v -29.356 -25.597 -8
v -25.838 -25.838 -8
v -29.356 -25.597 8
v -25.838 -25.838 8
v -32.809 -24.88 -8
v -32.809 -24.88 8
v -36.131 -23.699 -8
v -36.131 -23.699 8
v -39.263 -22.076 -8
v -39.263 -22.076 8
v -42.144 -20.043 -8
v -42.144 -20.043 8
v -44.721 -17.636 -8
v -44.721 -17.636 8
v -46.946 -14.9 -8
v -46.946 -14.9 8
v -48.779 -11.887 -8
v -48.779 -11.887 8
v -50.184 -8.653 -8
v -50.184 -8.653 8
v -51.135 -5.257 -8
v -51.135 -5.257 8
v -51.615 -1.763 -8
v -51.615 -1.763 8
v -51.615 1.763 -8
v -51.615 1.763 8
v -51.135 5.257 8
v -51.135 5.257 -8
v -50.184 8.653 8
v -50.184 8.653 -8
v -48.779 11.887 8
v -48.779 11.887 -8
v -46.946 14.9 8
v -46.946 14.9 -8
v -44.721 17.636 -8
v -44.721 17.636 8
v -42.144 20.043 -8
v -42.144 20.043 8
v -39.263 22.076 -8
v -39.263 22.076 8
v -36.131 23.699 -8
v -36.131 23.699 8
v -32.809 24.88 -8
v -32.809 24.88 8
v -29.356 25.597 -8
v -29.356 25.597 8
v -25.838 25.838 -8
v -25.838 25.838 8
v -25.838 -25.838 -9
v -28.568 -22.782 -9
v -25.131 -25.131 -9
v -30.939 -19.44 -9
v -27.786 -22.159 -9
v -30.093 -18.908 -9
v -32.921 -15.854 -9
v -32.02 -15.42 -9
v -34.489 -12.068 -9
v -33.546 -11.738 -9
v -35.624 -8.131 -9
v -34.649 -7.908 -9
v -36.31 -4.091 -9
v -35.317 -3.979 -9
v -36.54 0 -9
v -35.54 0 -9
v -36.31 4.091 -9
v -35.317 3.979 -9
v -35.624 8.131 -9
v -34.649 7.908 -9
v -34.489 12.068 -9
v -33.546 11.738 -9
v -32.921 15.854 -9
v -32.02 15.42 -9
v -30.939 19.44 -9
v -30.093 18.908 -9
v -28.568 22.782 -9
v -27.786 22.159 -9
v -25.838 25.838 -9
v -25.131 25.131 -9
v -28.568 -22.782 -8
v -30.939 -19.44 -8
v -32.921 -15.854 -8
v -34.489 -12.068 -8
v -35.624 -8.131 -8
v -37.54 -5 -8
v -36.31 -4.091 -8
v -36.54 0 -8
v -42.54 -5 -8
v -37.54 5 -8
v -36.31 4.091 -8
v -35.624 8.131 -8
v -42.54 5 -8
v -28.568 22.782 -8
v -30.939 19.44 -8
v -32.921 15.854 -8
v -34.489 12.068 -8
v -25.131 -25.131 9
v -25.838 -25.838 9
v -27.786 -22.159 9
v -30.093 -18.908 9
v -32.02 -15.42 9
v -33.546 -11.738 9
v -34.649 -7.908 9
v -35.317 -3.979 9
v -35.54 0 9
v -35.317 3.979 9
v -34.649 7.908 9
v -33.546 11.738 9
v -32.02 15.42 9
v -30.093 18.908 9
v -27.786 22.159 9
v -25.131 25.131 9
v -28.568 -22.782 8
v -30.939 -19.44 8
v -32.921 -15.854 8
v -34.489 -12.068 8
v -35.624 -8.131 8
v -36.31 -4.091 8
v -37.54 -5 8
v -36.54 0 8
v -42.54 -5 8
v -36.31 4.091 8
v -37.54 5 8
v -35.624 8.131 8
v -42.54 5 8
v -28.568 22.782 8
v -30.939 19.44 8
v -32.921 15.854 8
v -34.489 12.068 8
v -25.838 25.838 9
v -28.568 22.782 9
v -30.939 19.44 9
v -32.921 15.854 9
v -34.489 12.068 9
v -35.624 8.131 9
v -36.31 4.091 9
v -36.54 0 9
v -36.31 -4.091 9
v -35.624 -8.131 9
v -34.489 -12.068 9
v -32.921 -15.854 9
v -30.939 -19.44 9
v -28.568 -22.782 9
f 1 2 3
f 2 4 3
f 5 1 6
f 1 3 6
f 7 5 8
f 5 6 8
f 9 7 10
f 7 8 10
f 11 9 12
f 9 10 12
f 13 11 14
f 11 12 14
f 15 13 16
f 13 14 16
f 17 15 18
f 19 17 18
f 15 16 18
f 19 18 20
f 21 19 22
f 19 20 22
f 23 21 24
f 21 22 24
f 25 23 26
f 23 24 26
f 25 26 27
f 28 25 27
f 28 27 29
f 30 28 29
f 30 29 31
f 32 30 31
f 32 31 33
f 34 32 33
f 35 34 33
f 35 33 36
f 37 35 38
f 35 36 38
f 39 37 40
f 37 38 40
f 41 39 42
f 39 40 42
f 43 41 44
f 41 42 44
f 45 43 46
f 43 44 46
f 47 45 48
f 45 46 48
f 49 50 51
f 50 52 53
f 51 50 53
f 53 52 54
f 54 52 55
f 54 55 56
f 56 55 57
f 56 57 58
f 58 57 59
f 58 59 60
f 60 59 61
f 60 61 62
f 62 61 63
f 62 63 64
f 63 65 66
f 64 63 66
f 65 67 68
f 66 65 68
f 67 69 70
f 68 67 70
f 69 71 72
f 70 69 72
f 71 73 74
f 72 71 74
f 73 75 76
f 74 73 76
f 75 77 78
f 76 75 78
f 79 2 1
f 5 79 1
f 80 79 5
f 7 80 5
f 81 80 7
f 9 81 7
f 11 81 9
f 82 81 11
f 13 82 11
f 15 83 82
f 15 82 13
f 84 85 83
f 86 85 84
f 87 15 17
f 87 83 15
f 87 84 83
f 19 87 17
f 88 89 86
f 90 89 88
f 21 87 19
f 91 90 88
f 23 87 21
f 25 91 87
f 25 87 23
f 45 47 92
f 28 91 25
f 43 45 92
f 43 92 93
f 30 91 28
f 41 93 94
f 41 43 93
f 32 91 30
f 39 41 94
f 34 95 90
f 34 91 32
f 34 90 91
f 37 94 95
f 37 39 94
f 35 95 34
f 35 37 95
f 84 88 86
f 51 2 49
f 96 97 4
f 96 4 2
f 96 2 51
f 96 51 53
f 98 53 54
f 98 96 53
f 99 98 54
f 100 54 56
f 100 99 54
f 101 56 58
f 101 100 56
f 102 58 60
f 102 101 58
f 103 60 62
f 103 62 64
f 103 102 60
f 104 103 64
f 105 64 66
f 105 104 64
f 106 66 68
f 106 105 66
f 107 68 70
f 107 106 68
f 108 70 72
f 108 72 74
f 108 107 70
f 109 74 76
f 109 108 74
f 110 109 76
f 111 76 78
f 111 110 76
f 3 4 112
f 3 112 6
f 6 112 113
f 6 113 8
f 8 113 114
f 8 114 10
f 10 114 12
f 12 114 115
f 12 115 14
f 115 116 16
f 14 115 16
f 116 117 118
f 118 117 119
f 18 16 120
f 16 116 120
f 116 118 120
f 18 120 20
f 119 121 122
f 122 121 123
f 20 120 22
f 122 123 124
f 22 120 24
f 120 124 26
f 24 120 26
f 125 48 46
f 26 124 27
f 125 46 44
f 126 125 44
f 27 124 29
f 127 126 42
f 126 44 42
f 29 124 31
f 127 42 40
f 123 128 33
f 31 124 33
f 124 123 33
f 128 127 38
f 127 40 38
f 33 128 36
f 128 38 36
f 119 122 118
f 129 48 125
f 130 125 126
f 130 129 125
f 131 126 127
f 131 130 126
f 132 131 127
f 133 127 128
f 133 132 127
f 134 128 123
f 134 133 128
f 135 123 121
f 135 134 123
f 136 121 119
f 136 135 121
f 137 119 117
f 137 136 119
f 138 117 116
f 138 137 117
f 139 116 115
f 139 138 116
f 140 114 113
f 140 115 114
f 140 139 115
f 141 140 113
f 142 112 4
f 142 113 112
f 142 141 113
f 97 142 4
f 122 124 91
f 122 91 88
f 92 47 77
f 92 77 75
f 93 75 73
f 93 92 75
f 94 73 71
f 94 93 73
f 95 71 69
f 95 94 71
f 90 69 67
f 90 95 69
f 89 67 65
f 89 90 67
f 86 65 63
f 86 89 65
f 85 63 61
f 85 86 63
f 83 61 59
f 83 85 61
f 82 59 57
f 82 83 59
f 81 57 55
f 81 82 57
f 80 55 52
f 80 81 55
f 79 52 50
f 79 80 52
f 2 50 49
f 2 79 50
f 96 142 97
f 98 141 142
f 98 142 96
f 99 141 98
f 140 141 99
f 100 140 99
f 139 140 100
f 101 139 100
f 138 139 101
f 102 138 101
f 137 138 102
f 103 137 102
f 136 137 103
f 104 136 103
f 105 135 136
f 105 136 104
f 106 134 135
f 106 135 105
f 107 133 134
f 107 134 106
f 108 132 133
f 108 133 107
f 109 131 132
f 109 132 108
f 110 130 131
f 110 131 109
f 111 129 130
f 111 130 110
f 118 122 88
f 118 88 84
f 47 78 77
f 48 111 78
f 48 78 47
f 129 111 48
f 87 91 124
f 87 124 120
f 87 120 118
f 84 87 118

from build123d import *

# Parameters (mm, degrees)
BOSS_EXTRUDE1_DEPTH = 9
BOSS_EXTRUDE2_DEPTH = 8
BOSS_EXTRUDE3_DEPTH = 8
BOSS_EXTRUDE4_DEPTH = 8


with BuildPart() as part:
    # Sketch2 → Boss-Extrude1 (new, symmetric)
    with BuildSketch(Plane.XY):
        with BuildLine():
            ThreePointArc((-25.130575003, -25.130575003), (-35.54, 0), (-25.130575003, 25.130575003))
            Line((-25.130575003, 25.130575003), (-25.837681785, 25.837681785))
            ThreePointArc((-25.837681785, 25.837681785), (-36.54, 0), (-25.837681785, -25.837681785))
            Line((-25.837681785, -25.837681785), (-25.130575003, -25.130575003))
        make_face()
    extrude(amount=BOSS_EXTRUDE1_DEPTH, both=True)

    # Sketch3 → Boss-Extrude2 (add, symmetric)
    with BuildSketch(Plane.XY):
        with BuildLine():
            ThreePointArc((-25.837681785, 25.837681785), (-33.599252383, 16.491716629), (-37.54, 5))
            Line((-37.54, 5), (-37.54, 0))
            Line((-37.54, 0), (-37.54, -5))
            ThreePointArc((-37.54, -5), (-33.599252383, -16.491716629), (-25.837681785, -25.837681785))
            ThreePointArc((-25.837681785, -25.837681785), (-36.54, 0), (-25.837681785, 25.837681785))
        make_face()
    extrude(amount=BOSS_EXTRUDE2_DEPTH, both=True)



with BuildPart() as body_2:
    # Sketch4 → Boss-Extrude3 (new, symmetric)
    with BuildSketch(Plane.XY):
        with BuildLine():
            Line((-42.54, 5), (-42.54, -5))
            ThreePointArc((-42.54, -5), (-36.829168158, -17.535179295), (-25.837681785, -25.837681785))
            ThreePointArc((-25.837681785, -25.837681785), (-51.675363569, 0), (-25.837681785, 25.837681785))
            ThreePointArc((-25.837681785, 25.837681785), (-36.829168158, 17.535179295), (-42.54, 5))
        make_face()
    extrude(amount=BOSS_EXTRUDE3_DEPTH, both=True)


with BuildPart() as part_1:
    add(part.part)

    add(body_2.part)  # Boss-Extrude4 merges body 2
    # Sketch5 → Boss-Extrude4 (add, symmetric)
    with BuildSketch(Plane.XY):
        with BuildLine():
            Line((-42.54, 5), (-37.54, 5))
            ThreePointArc((-37.54, 5), (-33.599252383, 16.491716629), (-25.837681785, 25.837681785))
            ThreePointArc((-25.837681785, 25.837681785), (-36.829168158, 17.535179295), (-42.54, 5))
        make_face()
        with BuildLine():
            Line((-42.54, -5), (-37.54, -5))
            ThreePointArc((-37.54, -5), (-33.599252383, -16.491716629), (-25.837681785, -25.837681785))
            ThreePointArc((-25.837681785, -25.837681785), (-36.829168158, -17.535179295), (-42.54, -5))
        make_face()
    extrude(amount=BOSS_EXTRUDE4_DEPTH, both=True)


solid = part_1.part
